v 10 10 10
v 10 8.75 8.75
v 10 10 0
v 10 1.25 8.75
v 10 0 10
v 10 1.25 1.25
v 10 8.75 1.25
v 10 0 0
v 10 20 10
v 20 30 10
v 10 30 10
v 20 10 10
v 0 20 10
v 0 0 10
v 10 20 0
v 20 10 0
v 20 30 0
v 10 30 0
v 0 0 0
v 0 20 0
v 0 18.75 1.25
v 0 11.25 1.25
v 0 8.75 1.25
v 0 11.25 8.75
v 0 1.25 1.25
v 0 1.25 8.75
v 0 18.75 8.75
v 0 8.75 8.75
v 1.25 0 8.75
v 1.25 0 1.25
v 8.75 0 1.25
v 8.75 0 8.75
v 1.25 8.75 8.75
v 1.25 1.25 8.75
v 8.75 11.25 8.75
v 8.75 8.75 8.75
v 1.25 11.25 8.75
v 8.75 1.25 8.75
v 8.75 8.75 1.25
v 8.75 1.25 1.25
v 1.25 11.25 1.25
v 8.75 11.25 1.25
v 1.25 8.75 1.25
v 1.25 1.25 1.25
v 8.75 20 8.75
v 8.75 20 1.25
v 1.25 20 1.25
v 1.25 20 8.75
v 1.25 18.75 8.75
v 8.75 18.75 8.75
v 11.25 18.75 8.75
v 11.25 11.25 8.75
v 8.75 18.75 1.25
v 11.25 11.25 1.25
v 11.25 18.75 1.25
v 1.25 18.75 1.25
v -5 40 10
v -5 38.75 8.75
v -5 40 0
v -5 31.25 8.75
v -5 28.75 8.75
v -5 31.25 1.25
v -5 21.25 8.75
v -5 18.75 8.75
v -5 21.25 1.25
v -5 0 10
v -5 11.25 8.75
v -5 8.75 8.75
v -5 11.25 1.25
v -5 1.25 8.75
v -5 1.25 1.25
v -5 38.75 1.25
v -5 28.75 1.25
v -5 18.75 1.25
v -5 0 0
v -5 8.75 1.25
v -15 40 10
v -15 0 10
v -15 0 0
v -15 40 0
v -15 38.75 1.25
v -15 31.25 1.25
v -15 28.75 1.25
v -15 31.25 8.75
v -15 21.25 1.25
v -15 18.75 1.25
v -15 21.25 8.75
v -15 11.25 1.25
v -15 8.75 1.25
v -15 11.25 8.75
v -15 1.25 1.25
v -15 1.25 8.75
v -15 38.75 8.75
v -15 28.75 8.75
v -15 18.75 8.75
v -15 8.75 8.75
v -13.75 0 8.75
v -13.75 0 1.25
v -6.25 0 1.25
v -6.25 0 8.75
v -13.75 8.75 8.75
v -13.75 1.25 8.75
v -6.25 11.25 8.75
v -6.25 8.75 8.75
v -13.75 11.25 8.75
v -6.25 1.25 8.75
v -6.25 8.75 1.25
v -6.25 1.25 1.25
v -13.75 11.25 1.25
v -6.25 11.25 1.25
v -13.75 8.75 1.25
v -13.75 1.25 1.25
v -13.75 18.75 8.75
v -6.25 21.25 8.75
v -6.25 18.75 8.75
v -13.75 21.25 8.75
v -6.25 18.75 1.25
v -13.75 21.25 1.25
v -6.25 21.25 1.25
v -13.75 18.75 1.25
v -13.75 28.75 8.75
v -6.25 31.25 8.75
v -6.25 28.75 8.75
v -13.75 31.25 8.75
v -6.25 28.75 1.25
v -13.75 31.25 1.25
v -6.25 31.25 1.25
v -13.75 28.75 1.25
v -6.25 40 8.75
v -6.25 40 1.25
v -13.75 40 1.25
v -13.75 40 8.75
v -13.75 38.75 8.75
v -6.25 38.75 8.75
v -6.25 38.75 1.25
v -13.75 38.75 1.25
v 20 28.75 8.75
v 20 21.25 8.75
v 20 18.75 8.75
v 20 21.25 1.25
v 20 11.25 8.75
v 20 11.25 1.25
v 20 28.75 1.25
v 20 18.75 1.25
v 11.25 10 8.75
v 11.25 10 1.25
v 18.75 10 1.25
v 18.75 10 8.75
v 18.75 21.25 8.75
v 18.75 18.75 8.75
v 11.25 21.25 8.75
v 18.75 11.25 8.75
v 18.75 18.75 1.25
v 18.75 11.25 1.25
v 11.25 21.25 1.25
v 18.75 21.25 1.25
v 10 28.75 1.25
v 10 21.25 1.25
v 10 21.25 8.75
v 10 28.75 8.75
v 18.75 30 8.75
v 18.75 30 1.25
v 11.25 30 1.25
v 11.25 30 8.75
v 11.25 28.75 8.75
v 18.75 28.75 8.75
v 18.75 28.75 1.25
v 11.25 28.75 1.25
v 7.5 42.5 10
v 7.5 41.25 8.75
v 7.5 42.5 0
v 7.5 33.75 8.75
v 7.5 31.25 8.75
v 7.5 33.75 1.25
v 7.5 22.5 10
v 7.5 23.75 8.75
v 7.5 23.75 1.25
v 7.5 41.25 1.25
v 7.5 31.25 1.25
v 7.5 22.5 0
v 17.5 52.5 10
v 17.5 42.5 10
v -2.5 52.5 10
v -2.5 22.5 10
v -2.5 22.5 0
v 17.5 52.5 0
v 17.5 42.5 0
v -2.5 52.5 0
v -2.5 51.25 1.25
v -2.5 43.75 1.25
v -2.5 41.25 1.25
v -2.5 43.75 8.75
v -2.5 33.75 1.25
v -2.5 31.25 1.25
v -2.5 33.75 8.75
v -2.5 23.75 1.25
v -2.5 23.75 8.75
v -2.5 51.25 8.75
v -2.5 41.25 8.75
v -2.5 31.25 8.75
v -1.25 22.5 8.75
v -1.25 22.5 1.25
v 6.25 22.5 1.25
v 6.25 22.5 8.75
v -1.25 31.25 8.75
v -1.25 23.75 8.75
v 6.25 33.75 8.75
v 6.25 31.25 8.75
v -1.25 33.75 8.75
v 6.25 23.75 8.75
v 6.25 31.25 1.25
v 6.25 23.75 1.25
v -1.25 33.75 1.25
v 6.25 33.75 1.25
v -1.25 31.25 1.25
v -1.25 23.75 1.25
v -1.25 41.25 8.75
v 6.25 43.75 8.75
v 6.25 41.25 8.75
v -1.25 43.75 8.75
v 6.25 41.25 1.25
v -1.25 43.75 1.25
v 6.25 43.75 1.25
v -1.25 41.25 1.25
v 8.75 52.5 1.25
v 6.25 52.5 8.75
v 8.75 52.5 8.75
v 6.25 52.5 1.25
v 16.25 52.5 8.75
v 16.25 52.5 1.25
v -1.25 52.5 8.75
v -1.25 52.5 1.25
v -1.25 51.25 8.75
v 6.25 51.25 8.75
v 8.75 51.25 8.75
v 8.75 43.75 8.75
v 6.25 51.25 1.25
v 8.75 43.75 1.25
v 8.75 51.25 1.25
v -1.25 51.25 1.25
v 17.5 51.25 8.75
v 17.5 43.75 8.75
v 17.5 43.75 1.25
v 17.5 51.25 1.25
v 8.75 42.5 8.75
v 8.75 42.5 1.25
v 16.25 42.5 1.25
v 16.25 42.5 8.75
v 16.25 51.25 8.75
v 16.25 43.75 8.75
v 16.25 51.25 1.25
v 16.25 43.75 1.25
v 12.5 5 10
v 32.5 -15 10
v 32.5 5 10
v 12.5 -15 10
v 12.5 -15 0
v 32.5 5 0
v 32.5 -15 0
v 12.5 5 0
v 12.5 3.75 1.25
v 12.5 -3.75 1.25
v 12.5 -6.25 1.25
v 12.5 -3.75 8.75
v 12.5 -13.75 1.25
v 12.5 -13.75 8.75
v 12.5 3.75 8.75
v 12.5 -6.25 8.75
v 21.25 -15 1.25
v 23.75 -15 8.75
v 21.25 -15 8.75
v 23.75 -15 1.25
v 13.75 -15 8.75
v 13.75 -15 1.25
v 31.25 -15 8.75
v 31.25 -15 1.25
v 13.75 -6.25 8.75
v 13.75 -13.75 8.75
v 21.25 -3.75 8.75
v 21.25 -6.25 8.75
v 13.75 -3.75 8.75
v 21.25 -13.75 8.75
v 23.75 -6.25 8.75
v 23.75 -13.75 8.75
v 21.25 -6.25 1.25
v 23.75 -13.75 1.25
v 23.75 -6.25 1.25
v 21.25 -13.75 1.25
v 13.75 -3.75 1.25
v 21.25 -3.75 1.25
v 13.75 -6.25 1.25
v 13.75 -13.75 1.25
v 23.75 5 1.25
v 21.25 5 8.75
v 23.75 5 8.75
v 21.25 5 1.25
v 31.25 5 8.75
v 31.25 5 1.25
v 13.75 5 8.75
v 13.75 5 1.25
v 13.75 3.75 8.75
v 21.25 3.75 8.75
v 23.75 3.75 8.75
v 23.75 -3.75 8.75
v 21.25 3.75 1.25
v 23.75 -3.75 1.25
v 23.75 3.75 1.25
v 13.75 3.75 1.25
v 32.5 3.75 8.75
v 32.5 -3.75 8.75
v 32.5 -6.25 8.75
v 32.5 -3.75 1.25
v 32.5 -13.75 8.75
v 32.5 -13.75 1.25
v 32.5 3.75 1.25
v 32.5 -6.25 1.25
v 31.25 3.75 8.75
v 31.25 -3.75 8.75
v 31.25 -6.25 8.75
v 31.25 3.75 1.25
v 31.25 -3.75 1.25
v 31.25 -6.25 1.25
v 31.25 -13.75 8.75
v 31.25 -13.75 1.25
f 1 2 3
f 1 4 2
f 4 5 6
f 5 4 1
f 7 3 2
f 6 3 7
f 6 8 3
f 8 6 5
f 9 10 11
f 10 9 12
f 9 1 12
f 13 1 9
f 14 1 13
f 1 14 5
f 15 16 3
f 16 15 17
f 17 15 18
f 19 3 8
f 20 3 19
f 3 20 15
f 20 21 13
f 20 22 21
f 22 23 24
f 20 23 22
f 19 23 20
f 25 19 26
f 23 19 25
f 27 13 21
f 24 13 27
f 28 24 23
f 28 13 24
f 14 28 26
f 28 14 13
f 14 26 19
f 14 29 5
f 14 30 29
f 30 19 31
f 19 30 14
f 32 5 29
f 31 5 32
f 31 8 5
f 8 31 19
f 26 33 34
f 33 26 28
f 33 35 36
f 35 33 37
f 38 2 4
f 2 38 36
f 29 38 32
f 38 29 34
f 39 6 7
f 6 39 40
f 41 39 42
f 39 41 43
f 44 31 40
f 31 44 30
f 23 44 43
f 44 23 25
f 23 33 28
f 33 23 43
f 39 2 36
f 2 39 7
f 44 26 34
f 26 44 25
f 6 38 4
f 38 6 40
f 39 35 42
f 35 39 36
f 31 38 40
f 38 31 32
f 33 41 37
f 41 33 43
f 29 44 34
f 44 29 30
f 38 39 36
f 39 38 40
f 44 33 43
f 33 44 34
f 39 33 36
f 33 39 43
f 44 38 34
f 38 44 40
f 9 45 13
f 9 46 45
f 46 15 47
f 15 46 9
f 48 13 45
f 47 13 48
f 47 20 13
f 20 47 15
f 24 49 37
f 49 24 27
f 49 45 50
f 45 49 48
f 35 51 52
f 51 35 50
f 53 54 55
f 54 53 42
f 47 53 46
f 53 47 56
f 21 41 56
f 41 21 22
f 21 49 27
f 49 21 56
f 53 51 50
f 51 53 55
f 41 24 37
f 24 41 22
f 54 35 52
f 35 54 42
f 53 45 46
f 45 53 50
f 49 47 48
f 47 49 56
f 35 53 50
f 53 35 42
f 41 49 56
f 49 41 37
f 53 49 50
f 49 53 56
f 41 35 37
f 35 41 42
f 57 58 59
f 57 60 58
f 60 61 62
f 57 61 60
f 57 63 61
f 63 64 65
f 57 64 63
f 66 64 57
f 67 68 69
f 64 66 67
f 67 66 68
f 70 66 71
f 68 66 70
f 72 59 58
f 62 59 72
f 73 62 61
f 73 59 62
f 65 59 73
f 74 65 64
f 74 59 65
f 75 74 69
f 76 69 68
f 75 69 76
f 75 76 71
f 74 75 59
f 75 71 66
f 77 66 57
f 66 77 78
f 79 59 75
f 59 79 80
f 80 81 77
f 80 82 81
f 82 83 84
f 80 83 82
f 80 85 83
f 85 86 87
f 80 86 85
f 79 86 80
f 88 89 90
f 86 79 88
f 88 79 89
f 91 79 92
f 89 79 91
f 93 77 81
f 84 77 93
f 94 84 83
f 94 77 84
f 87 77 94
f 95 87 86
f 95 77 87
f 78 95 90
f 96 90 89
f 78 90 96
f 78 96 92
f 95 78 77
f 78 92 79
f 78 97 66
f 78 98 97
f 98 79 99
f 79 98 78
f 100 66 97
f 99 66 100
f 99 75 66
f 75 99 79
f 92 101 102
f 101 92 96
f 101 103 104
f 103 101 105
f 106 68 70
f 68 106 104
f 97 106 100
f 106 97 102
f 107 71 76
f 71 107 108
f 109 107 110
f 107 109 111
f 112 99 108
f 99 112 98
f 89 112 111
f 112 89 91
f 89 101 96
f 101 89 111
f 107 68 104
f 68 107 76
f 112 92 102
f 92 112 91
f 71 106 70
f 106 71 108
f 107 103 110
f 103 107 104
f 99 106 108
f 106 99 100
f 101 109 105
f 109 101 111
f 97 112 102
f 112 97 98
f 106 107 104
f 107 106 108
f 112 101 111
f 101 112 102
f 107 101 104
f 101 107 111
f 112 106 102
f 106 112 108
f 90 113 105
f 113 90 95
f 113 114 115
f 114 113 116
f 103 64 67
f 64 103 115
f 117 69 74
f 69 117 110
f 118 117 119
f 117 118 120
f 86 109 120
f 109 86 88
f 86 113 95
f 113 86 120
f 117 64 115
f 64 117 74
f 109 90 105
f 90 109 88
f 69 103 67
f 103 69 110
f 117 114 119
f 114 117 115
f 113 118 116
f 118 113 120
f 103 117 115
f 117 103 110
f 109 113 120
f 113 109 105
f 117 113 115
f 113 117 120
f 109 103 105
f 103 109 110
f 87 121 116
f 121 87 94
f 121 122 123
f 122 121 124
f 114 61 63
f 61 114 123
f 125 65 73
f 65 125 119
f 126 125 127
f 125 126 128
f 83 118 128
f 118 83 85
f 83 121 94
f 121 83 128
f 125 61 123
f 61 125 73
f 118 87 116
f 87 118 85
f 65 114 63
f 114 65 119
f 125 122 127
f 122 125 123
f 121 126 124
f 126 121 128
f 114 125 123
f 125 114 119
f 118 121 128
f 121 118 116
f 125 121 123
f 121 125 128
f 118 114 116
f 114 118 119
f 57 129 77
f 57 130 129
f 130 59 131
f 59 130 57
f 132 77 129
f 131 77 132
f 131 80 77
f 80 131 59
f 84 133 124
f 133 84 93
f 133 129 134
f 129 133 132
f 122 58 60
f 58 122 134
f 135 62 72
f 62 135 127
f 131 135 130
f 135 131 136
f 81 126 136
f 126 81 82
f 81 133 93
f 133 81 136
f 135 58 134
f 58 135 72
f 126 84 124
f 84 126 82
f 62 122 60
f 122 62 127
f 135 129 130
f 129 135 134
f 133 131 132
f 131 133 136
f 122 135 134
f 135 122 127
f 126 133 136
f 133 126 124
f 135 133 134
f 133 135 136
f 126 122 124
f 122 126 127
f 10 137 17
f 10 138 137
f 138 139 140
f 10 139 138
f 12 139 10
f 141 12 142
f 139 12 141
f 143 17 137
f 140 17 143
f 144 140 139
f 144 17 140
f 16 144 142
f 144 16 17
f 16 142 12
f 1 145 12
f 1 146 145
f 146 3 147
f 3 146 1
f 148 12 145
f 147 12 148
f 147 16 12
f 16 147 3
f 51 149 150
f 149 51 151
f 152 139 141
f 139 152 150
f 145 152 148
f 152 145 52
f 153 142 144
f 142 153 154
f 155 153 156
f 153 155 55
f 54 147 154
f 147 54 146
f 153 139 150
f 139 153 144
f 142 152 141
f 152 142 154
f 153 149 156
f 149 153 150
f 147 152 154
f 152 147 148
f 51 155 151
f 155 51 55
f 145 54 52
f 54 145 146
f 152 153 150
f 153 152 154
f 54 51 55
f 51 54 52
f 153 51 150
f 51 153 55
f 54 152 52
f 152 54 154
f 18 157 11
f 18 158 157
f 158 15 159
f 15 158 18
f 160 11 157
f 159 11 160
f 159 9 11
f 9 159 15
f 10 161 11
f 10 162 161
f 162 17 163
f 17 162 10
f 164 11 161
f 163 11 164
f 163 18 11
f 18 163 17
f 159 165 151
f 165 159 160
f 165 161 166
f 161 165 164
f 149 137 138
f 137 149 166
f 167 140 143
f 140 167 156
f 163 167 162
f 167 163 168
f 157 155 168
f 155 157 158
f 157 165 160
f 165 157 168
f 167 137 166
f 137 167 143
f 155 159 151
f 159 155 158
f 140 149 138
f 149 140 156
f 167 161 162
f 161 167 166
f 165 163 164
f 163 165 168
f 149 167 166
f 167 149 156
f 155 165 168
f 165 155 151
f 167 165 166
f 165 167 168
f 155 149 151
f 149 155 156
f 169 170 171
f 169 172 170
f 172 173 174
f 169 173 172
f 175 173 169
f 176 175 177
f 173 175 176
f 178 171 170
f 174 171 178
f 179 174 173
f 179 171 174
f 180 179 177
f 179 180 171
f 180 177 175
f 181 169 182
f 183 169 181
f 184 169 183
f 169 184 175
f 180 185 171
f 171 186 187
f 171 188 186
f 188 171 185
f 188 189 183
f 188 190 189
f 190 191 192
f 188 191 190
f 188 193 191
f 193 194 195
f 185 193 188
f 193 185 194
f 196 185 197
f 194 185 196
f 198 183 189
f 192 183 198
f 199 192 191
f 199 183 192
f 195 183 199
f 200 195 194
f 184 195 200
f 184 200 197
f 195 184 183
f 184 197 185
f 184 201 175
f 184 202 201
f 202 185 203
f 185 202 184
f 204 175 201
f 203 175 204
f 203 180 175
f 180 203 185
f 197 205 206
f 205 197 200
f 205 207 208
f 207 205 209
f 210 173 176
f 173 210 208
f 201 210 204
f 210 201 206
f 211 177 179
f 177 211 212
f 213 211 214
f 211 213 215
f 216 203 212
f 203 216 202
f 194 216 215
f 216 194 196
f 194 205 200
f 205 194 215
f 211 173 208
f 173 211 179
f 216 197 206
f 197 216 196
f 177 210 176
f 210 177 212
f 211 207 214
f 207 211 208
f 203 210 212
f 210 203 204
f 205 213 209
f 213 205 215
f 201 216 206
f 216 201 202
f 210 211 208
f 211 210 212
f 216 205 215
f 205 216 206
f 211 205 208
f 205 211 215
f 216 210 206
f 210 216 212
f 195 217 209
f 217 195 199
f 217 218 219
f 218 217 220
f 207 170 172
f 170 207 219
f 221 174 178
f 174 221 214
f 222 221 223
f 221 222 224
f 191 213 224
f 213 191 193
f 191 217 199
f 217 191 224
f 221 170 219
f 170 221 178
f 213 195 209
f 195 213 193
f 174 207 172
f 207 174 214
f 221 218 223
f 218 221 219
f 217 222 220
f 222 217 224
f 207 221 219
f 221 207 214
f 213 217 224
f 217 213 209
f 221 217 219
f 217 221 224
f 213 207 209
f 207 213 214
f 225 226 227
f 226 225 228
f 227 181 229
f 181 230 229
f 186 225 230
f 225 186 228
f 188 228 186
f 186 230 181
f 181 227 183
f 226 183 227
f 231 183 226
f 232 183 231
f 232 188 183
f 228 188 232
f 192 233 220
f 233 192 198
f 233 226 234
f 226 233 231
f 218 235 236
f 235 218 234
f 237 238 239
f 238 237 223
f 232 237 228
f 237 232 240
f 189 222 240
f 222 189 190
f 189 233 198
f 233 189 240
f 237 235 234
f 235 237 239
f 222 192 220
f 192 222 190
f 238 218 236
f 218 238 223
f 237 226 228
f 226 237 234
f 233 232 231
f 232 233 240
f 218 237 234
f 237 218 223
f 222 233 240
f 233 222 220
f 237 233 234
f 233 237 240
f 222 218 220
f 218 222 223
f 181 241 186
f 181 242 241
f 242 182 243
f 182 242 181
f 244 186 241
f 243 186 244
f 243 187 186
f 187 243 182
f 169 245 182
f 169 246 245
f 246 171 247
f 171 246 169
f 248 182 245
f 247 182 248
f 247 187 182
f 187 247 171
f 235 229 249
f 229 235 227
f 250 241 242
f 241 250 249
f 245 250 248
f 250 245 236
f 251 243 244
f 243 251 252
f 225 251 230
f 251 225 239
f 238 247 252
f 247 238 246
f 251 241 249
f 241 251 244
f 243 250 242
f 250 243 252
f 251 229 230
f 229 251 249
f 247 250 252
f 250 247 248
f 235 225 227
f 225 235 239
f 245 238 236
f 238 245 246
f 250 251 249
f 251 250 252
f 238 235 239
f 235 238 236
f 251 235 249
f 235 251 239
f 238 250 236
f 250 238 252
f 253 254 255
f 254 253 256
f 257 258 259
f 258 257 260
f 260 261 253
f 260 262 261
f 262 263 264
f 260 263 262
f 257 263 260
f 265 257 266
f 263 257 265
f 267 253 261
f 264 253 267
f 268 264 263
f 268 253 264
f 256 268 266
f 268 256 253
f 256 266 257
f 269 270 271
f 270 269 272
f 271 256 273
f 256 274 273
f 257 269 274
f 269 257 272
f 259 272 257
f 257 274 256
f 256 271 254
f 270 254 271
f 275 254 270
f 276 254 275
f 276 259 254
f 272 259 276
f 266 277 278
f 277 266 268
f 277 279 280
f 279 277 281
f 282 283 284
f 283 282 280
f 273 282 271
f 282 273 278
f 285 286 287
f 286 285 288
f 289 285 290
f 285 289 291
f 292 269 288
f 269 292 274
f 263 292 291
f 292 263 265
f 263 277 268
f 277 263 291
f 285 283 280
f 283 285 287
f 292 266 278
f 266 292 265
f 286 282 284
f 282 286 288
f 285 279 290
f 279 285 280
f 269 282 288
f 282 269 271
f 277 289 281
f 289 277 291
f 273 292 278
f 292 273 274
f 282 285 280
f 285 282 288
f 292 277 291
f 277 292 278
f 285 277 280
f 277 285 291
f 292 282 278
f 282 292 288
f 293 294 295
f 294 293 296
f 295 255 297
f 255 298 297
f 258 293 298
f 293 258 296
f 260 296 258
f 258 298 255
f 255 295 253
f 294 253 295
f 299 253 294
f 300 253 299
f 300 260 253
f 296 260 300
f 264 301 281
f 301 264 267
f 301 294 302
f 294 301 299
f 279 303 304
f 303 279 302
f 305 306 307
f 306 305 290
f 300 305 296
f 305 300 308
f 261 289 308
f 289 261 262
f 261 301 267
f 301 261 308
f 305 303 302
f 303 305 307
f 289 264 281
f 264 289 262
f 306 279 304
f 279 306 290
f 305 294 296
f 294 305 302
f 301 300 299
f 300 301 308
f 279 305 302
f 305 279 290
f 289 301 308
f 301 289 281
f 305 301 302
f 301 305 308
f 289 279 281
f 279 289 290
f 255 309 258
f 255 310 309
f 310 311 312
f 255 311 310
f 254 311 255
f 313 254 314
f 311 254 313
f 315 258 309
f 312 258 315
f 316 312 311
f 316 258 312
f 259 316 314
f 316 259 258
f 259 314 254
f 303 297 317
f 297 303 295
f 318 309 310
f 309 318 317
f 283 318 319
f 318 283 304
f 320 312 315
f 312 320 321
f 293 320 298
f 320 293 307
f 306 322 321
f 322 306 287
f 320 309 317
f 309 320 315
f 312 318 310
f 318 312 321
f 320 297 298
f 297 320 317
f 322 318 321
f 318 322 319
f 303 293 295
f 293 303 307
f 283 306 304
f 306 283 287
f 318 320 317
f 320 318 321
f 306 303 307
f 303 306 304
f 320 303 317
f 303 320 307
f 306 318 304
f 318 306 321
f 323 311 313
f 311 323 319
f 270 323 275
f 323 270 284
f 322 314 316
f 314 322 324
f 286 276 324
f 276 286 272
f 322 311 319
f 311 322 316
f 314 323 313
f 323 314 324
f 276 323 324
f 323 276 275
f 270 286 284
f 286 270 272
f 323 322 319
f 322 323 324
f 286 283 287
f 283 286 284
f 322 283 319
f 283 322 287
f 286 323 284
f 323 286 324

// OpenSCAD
block_size = 10;
b = [block_size, block_size, block_size];
face_size = block_size * 3 / 4;
face_offset = (block_size - face_size) / 2;



module hollow_cube(){
    difference() {
        cube(b);
        translate([0, face_offset, face_offset]) cube([block_size, face_size, face_size]);
        translate([face_offset, 0, face_offset]) cube([face_size, block_size, face_size]);
        //translate([face_offset, face_offset, 0]) cube([face_size, face_size, block_size]);
    }
}

module tetris_cube() {
    hollow_cube();
    translate([face_offset, face_offset, face_offset]) cube([face_size, face_size, face_size]);
}


module tetris_I(){
    tetris_cube();
    translate([0, block_size, 0]) tetris_cube();
    translate([0, block_size * 2, 0]) tetris_cube();
    translate([0, block_size * 3, 0]) tetris_cube();
}

module tetris_L(){
    tetris_cube();
    translate([0, block_size, 0])tetris_cube();
    translate([0, block_size * 2, 0]) tetris_cube();
    translate([block_size, block_size * 2, 0]) tetris_cube();
}
module tetris_block(){
    tetris_cube();
    translate([0, block_size, 0]) tetris_cube();
    translate([block_size, block_size, 0]) tetris_cube();
    translate([block_size, 0, 0]) tetris_cube();
}

module tetris_Z(){
    tetris_cube();
    translate([0, block_size, 0]) tetris_cube();
    translate([block_size, block_size, 0]) tetris_cube();
    translate([block_size, block_size * 2, 0]) tetris_cube();
}



translate([-block_size * 1.5, 0]) tetris_I();

tetris_Z();

translate([ -block_size * .25, block_size * 2.25, 0]) tetris_L();

translate([ block_size * 1.25, -block_size * 1.5, 0]) tetris_block();    
